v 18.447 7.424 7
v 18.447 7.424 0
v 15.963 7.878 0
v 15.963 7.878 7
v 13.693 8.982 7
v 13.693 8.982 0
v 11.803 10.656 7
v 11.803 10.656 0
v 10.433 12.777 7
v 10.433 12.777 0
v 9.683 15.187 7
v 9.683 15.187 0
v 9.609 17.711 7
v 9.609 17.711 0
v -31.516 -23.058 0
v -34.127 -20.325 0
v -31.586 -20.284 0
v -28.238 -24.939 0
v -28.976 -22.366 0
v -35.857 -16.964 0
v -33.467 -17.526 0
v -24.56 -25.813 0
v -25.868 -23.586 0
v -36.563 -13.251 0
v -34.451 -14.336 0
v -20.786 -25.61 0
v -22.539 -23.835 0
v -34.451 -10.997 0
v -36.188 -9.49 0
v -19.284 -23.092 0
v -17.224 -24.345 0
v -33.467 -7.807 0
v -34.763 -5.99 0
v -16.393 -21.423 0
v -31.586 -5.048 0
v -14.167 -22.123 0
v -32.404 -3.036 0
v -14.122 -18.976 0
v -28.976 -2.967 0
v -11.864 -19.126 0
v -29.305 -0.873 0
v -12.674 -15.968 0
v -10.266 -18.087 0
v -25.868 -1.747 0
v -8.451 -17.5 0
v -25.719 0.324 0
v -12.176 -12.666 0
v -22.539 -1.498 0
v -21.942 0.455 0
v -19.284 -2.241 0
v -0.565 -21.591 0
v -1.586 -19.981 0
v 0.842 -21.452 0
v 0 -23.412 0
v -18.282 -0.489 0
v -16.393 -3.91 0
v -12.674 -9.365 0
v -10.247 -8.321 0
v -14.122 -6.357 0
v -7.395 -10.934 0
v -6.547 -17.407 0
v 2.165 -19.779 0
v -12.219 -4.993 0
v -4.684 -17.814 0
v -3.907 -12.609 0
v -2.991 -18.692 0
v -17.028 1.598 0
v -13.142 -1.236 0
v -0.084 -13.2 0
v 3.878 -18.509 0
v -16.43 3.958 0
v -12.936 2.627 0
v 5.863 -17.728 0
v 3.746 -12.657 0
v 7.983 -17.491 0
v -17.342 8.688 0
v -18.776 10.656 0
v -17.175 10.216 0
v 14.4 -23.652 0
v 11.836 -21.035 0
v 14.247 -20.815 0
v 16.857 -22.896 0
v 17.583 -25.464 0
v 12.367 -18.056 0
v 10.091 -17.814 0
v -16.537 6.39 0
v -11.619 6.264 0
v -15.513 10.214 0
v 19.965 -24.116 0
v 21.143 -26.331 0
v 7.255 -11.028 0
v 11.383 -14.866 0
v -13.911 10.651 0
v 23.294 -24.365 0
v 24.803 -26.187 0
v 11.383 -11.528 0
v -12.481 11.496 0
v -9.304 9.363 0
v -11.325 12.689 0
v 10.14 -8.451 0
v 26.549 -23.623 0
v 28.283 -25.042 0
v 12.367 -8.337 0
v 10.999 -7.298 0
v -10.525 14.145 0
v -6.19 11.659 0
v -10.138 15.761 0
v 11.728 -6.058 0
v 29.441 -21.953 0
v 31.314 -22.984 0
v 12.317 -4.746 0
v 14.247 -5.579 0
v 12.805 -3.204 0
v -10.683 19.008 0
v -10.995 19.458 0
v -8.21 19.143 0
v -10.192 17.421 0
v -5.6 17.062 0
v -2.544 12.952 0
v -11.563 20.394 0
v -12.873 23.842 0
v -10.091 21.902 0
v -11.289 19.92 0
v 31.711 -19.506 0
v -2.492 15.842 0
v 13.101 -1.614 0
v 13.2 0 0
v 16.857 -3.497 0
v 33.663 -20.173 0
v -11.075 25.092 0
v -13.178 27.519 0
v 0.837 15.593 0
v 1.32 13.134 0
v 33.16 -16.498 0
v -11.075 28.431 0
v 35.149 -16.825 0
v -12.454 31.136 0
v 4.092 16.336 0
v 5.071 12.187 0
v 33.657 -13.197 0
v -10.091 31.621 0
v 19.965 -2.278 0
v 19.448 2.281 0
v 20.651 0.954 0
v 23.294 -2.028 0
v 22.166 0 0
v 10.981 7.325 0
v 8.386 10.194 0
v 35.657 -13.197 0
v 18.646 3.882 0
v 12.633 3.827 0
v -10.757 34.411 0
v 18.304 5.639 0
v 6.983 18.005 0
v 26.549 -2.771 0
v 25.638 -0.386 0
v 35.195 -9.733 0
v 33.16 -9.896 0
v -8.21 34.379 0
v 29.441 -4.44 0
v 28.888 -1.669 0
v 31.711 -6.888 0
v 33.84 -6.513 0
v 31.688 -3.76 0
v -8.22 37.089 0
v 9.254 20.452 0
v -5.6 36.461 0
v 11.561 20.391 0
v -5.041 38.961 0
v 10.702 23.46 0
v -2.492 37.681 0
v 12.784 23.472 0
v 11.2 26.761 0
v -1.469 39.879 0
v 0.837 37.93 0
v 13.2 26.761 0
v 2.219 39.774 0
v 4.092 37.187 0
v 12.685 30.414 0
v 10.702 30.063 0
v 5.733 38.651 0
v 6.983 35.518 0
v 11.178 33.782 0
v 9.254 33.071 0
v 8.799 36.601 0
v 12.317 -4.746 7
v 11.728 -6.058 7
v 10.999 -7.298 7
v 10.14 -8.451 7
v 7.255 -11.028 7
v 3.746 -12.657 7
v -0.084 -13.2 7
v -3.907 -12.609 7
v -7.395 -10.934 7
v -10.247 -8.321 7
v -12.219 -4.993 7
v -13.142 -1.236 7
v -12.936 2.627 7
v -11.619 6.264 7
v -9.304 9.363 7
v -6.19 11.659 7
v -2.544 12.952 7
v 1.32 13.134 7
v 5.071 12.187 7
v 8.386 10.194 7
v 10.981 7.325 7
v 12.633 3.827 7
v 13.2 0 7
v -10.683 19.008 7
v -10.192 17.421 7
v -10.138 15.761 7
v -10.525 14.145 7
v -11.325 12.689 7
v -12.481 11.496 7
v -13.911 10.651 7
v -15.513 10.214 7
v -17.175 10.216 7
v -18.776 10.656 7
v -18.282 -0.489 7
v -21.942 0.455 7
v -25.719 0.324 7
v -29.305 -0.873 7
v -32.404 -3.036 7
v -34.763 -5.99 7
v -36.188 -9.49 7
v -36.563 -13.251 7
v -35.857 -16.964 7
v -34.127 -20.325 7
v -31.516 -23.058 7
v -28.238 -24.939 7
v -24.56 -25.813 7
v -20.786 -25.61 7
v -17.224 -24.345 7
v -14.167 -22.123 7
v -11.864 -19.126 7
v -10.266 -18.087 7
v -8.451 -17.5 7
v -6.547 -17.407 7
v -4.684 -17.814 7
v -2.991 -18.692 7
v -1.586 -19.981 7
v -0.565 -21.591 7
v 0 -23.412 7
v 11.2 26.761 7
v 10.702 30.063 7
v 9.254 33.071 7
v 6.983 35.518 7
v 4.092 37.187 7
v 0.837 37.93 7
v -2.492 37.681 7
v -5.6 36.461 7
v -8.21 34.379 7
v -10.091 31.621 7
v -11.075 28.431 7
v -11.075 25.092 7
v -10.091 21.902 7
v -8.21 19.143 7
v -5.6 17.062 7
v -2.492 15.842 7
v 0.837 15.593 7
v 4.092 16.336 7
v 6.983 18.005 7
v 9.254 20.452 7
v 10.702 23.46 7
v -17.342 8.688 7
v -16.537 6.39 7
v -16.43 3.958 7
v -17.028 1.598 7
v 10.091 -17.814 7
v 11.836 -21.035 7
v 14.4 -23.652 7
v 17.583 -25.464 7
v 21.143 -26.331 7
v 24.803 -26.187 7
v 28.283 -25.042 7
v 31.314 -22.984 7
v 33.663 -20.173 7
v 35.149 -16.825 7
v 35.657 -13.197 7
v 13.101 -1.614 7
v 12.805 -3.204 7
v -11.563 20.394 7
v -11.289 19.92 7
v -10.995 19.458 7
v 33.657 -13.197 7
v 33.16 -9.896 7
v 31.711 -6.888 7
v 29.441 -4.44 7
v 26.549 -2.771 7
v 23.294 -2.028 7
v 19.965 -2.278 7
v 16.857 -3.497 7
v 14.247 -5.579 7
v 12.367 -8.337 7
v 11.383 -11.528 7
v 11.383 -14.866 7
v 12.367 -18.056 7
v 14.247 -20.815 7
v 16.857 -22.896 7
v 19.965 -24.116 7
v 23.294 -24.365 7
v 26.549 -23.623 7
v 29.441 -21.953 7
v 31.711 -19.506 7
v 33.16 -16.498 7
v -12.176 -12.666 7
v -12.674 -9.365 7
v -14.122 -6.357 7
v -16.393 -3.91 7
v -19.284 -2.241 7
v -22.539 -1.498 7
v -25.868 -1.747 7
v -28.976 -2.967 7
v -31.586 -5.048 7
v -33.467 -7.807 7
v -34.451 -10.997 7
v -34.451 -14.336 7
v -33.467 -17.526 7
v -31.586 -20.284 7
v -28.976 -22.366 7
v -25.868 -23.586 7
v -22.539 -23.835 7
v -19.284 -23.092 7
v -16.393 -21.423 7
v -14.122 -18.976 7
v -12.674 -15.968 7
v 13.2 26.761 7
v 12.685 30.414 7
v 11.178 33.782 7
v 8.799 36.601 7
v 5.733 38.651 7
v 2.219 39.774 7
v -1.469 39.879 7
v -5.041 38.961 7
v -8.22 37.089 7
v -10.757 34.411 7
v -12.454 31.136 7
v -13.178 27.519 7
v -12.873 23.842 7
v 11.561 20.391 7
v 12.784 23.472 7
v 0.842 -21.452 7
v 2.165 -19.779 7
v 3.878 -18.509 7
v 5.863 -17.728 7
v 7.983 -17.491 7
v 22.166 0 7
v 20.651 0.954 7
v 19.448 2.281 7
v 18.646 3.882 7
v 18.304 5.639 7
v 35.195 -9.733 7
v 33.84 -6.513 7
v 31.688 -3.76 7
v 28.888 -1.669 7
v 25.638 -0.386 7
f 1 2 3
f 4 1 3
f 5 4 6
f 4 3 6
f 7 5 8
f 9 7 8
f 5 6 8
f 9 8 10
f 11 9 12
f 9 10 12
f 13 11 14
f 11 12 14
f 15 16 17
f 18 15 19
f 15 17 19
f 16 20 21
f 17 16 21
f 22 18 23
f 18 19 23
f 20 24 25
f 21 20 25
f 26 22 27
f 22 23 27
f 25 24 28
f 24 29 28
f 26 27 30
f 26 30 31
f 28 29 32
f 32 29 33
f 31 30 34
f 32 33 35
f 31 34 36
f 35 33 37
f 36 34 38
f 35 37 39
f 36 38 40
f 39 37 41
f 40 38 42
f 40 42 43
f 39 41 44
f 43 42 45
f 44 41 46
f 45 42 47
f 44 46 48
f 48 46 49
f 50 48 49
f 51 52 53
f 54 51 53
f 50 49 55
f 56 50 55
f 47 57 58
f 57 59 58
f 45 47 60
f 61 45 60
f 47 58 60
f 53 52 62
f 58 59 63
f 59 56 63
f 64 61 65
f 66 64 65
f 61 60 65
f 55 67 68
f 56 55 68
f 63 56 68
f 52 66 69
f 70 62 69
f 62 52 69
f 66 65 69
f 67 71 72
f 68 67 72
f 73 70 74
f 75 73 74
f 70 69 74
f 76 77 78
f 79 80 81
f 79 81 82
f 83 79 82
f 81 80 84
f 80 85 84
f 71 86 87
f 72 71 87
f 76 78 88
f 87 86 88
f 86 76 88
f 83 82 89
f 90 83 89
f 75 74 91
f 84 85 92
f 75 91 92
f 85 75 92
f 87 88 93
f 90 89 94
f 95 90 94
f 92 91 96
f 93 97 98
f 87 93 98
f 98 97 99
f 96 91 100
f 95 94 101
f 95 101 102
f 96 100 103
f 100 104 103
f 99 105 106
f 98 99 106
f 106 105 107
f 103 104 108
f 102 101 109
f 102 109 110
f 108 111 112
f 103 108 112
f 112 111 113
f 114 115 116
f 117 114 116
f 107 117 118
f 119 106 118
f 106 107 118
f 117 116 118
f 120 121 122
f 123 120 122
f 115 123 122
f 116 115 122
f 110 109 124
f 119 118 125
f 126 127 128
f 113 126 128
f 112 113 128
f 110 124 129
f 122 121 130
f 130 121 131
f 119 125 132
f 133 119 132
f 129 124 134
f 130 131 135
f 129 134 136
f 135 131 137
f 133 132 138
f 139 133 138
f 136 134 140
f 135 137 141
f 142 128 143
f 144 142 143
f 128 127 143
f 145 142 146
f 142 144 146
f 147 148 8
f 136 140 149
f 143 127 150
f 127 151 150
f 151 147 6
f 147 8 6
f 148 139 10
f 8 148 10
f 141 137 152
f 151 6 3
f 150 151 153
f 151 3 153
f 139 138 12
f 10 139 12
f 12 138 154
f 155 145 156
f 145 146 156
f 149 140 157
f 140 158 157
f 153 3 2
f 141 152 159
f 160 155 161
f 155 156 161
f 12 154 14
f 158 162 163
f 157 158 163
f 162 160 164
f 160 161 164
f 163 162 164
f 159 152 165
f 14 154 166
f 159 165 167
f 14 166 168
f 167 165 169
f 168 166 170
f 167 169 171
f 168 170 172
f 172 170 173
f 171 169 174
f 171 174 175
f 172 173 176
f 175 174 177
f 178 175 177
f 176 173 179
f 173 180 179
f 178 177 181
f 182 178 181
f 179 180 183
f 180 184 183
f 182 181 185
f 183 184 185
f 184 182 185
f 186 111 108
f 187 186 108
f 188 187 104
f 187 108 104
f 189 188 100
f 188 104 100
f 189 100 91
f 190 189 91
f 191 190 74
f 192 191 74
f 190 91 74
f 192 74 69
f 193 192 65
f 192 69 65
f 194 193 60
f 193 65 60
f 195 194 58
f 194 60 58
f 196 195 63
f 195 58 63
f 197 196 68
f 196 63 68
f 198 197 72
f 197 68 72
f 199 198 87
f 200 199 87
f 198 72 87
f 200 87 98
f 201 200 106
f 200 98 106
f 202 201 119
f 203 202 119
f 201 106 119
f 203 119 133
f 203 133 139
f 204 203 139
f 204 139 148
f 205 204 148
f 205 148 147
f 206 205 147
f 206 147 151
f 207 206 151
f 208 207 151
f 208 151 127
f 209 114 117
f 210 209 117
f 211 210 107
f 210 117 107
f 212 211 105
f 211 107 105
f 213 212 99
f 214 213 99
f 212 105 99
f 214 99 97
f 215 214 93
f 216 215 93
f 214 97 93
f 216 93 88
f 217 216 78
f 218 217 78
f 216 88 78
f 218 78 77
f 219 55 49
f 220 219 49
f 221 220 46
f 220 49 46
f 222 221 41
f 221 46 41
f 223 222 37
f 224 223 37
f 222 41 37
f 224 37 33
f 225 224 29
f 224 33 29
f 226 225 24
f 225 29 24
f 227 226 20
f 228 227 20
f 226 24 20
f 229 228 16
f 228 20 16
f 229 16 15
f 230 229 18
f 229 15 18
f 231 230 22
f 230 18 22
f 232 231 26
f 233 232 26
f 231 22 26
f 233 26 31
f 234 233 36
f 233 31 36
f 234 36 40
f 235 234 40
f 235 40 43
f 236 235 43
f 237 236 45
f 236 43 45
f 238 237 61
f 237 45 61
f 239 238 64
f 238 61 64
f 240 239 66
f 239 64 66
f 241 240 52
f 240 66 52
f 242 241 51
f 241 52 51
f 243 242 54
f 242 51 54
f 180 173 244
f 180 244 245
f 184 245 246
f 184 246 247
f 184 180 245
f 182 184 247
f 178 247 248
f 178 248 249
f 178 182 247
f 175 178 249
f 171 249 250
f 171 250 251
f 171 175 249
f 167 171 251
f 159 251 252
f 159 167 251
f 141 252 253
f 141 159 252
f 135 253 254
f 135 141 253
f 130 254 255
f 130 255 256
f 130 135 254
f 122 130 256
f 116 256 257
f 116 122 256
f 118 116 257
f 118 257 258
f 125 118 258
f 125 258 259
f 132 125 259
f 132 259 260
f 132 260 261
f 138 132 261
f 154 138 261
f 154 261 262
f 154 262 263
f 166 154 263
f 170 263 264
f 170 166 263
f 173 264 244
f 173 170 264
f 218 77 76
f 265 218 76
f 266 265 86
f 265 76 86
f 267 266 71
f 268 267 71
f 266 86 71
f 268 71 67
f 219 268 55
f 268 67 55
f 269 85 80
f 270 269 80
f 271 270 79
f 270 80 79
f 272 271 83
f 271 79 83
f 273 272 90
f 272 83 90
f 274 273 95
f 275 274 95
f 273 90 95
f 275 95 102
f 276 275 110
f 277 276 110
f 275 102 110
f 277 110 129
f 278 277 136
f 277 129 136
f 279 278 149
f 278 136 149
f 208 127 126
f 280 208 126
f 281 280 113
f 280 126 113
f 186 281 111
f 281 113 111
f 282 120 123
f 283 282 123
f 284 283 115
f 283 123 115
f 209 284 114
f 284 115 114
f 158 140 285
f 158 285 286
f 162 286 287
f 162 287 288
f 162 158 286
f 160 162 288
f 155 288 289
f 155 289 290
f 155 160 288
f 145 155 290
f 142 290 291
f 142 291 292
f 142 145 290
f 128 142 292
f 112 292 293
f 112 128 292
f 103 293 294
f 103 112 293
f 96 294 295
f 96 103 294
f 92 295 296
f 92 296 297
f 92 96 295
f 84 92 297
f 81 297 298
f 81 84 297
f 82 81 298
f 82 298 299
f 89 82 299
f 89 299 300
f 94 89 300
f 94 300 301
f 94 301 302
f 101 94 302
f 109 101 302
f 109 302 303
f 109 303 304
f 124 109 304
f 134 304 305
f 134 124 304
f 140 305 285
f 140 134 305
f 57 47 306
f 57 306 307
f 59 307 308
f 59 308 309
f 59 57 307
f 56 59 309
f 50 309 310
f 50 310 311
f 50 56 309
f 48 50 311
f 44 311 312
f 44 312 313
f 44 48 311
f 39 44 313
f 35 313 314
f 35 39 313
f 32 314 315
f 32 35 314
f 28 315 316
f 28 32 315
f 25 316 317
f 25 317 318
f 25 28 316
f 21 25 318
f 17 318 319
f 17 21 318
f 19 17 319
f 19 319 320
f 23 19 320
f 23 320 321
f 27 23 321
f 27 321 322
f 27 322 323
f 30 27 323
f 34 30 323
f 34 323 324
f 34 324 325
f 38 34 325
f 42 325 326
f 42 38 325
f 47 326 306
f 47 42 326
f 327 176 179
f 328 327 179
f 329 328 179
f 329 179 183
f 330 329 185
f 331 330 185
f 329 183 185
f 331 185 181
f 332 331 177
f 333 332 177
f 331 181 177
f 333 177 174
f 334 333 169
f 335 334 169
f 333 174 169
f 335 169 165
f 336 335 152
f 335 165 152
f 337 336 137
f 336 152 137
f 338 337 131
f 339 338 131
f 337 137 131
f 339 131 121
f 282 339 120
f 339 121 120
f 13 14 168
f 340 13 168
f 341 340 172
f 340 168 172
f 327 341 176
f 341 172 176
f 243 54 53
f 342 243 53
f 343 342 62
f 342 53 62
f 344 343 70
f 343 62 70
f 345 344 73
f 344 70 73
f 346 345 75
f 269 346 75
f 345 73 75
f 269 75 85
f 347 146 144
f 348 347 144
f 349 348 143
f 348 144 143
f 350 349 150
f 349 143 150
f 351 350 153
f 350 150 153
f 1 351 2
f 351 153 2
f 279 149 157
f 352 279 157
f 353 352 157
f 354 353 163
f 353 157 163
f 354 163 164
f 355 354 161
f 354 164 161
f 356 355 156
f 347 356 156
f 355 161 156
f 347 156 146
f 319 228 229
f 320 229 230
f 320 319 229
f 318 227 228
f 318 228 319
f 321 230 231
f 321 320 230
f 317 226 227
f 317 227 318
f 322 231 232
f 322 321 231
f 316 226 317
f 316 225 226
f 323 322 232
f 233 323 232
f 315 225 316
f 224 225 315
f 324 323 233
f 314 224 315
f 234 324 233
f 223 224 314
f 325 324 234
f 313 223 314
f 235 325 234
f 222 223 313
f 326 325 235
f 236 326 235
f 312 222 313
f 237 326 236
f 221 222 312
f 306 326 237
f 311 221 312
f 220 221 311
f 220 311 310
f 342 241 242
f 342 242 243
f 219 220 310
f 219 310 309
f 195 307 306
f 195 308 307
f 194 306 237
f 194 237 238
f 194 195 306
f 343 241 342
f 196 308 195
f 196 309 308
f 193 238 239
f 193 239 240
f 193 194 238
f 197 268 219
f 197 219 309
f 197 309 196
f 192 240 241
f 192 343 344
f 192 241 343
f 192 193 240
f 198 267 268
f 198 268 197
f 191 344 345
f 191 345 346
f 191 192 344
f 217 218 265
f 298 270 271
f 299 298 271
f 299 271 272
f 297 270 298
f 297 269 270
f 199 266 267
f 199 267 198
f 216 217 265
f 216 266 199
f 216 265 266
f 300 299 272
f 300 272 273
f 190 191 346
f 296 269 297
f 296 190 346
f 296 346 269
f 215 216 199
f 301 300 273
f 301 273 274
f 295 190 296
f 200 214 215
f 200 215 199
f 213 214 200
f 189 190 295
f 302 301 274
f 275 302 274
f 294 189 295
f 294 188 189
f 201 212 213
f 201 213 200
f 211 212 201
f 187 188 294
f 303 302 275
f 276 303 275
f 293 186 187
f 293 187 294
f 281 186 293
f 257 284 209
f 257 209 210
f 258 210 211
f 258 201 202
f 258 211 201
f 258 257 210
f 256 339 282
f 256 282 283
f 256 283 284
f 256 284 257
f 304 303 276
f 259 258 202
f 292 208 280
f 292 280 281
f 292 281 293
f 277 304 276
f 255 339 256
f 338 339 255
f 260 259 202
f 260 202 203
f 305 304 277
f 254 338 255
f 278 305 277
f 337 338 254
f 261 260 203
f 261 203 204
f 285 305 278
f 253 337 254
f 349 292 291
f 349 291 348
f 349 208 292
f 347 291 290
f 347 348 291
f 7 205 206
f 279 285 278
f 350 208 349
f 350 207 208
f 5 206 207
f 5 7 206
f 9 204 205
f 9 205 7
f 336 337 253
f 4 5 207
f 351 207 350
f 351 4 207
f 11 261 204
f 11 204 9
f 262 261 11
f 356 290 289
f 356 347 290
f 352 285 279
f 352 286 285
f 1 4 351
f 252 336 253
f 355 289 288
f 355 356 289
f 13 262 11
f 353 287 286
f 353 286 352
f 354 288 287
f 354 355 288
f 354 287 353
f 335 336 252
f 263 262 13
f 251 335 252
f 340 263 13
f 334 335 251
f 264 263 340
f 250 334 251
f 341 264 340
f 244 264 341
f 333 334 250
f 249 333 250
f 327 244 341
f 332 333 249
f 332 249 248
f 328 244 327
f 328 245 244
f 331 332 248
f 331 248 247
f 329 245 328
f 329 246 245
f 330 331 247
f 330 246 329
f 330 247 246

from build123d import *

# Parameters (mm, degrees)
F0_R     = 11.2
F1_DEPTH = 7


with BuildPart() as f1:
    # F0 (on Top) → F1 (new body)
    with BuildSketch(Plane.XY):
        with BuildLine():
            ThreePointArc((10.140133, -8.450899), (-12.411482, 4.493898), (13.2, 0))
            ThreePointArc((13.2, 0), (12.977457, -2.413629), (12.317332, -4.745875))
            ThreePointArc((12.317332, -4.745875), (16.727086, -1.305485), (22.165645, 0))
            ThreePointArc((22.165645, 0), (18.992247, 3.053889), (18.446518, 7.424114))
            ThreePointArc((18.446518, 7.424114), (11.802919, 10.656167), (9.608782, 17.710905))
            ThreePointArc((9.608782, 17.710905), (-0.841952, 13.588271), (-10.682802, 19.007829))
            ThreePointArc((-10.682802, 19.007829), (-11.862909, 12.054078), (-18.776167, 10.656167))
            ThreePointArc((-18.776167, 10.656167), (-16.394376, 5.178266), (-18.282297, -0.488839))
            ThreePointArc((-18.282297, -0.488839), (-12.387933, -5.351975), (-10.176054, -12.666426))
            ThreePointArc((-10.176054, -12.666426), (-10.605131, -16.004618), (-11.864467, -19.125788))
            ThreePointArc((-11.864467, -19.125788), (-4.683804, -17.813616), (0, -23.412337))
            ThreePointArc((0, -23.412337), (3.878012, -18.508514), (10.09119, -17.813616))
            ThreePointArc((10.09119, -17.813616), (9.257646, -13.127772), (10.140133, -8.450899))
        make_face()
        with BuildLine():
            ThreePointArc((12.317332, -4.745875), (11.38052, -6.687582), (10.140133, -8.450899))
            ThreePointArc((10.140133, -8.450899), (9.257646, -13.127772), (10.09119, -17.813616))
            ThreePointArc((10.09119, -17.813616), (24.803224, -26.186671), (35.657465, -13.196774))
            ThreePointArc((35.657465, -13.196774), (31.687524, -3.760354), (22.165645, 0))
            ThreePointArc((22.165645, 0), (16.727086, -1.305485), (12.317332, -4.745875))
        make_face()
        with Locations((22.457465, -13.196774)):
            Circle(F0_R, mode=Mode.SUBTRACT)
        with BuildLine():
            ThreePointArc((-18.282297, -0.488839), (-35.856773, -16.964294), (-11.864467, -19.125788))
            ThreePointArc((-11.864467, -19.125788), (-10.605131, -16.004618), (-10.176054, -12.666426))
            ThreePointArc((-10.176054, -12.666426), (-12.387933, -5.351975), (-18.282297, -0.488839))
        make_face()
        with Locations((-23.376054, -12.666426)):
            Circle(F0_R, mode=Mode.SUBTRACT)
        with BuildLine():
            ThreePointArc((-10.682802, 19.007829), (-0.841952, 13.588271), (9.608782, 17.710905))
            ThreePointArc((9.608782, 17.710905), (12.269391, 21.892918), (13.2, 26.761392))
            ThreePointArc((13.2, 26.761392), (-3.287299, 39.54551), (-11.562677, 20.393935))
            ThreePointArc((-11.562677, 20.393935), (-11.076889, 19.729987), (-10.682802, 19.007829))
        make_face()
        with Locations((0, 26.761392)):
            Circle(F0_R, mode=Mode.SUBTRACT)
        with BuildLine():
            ThreePointArc((-11.562677, 20.393935), (-11.14431, 19.687189), (-10.682802, 19.007829))
            ThreePointArc((-10.682802, 19.007829), (-11.076889, 19.729987), (-11.562677, 20.393935))
        make_face()
    extrude(amount=F1_DEPTH)


solid = f1.part
